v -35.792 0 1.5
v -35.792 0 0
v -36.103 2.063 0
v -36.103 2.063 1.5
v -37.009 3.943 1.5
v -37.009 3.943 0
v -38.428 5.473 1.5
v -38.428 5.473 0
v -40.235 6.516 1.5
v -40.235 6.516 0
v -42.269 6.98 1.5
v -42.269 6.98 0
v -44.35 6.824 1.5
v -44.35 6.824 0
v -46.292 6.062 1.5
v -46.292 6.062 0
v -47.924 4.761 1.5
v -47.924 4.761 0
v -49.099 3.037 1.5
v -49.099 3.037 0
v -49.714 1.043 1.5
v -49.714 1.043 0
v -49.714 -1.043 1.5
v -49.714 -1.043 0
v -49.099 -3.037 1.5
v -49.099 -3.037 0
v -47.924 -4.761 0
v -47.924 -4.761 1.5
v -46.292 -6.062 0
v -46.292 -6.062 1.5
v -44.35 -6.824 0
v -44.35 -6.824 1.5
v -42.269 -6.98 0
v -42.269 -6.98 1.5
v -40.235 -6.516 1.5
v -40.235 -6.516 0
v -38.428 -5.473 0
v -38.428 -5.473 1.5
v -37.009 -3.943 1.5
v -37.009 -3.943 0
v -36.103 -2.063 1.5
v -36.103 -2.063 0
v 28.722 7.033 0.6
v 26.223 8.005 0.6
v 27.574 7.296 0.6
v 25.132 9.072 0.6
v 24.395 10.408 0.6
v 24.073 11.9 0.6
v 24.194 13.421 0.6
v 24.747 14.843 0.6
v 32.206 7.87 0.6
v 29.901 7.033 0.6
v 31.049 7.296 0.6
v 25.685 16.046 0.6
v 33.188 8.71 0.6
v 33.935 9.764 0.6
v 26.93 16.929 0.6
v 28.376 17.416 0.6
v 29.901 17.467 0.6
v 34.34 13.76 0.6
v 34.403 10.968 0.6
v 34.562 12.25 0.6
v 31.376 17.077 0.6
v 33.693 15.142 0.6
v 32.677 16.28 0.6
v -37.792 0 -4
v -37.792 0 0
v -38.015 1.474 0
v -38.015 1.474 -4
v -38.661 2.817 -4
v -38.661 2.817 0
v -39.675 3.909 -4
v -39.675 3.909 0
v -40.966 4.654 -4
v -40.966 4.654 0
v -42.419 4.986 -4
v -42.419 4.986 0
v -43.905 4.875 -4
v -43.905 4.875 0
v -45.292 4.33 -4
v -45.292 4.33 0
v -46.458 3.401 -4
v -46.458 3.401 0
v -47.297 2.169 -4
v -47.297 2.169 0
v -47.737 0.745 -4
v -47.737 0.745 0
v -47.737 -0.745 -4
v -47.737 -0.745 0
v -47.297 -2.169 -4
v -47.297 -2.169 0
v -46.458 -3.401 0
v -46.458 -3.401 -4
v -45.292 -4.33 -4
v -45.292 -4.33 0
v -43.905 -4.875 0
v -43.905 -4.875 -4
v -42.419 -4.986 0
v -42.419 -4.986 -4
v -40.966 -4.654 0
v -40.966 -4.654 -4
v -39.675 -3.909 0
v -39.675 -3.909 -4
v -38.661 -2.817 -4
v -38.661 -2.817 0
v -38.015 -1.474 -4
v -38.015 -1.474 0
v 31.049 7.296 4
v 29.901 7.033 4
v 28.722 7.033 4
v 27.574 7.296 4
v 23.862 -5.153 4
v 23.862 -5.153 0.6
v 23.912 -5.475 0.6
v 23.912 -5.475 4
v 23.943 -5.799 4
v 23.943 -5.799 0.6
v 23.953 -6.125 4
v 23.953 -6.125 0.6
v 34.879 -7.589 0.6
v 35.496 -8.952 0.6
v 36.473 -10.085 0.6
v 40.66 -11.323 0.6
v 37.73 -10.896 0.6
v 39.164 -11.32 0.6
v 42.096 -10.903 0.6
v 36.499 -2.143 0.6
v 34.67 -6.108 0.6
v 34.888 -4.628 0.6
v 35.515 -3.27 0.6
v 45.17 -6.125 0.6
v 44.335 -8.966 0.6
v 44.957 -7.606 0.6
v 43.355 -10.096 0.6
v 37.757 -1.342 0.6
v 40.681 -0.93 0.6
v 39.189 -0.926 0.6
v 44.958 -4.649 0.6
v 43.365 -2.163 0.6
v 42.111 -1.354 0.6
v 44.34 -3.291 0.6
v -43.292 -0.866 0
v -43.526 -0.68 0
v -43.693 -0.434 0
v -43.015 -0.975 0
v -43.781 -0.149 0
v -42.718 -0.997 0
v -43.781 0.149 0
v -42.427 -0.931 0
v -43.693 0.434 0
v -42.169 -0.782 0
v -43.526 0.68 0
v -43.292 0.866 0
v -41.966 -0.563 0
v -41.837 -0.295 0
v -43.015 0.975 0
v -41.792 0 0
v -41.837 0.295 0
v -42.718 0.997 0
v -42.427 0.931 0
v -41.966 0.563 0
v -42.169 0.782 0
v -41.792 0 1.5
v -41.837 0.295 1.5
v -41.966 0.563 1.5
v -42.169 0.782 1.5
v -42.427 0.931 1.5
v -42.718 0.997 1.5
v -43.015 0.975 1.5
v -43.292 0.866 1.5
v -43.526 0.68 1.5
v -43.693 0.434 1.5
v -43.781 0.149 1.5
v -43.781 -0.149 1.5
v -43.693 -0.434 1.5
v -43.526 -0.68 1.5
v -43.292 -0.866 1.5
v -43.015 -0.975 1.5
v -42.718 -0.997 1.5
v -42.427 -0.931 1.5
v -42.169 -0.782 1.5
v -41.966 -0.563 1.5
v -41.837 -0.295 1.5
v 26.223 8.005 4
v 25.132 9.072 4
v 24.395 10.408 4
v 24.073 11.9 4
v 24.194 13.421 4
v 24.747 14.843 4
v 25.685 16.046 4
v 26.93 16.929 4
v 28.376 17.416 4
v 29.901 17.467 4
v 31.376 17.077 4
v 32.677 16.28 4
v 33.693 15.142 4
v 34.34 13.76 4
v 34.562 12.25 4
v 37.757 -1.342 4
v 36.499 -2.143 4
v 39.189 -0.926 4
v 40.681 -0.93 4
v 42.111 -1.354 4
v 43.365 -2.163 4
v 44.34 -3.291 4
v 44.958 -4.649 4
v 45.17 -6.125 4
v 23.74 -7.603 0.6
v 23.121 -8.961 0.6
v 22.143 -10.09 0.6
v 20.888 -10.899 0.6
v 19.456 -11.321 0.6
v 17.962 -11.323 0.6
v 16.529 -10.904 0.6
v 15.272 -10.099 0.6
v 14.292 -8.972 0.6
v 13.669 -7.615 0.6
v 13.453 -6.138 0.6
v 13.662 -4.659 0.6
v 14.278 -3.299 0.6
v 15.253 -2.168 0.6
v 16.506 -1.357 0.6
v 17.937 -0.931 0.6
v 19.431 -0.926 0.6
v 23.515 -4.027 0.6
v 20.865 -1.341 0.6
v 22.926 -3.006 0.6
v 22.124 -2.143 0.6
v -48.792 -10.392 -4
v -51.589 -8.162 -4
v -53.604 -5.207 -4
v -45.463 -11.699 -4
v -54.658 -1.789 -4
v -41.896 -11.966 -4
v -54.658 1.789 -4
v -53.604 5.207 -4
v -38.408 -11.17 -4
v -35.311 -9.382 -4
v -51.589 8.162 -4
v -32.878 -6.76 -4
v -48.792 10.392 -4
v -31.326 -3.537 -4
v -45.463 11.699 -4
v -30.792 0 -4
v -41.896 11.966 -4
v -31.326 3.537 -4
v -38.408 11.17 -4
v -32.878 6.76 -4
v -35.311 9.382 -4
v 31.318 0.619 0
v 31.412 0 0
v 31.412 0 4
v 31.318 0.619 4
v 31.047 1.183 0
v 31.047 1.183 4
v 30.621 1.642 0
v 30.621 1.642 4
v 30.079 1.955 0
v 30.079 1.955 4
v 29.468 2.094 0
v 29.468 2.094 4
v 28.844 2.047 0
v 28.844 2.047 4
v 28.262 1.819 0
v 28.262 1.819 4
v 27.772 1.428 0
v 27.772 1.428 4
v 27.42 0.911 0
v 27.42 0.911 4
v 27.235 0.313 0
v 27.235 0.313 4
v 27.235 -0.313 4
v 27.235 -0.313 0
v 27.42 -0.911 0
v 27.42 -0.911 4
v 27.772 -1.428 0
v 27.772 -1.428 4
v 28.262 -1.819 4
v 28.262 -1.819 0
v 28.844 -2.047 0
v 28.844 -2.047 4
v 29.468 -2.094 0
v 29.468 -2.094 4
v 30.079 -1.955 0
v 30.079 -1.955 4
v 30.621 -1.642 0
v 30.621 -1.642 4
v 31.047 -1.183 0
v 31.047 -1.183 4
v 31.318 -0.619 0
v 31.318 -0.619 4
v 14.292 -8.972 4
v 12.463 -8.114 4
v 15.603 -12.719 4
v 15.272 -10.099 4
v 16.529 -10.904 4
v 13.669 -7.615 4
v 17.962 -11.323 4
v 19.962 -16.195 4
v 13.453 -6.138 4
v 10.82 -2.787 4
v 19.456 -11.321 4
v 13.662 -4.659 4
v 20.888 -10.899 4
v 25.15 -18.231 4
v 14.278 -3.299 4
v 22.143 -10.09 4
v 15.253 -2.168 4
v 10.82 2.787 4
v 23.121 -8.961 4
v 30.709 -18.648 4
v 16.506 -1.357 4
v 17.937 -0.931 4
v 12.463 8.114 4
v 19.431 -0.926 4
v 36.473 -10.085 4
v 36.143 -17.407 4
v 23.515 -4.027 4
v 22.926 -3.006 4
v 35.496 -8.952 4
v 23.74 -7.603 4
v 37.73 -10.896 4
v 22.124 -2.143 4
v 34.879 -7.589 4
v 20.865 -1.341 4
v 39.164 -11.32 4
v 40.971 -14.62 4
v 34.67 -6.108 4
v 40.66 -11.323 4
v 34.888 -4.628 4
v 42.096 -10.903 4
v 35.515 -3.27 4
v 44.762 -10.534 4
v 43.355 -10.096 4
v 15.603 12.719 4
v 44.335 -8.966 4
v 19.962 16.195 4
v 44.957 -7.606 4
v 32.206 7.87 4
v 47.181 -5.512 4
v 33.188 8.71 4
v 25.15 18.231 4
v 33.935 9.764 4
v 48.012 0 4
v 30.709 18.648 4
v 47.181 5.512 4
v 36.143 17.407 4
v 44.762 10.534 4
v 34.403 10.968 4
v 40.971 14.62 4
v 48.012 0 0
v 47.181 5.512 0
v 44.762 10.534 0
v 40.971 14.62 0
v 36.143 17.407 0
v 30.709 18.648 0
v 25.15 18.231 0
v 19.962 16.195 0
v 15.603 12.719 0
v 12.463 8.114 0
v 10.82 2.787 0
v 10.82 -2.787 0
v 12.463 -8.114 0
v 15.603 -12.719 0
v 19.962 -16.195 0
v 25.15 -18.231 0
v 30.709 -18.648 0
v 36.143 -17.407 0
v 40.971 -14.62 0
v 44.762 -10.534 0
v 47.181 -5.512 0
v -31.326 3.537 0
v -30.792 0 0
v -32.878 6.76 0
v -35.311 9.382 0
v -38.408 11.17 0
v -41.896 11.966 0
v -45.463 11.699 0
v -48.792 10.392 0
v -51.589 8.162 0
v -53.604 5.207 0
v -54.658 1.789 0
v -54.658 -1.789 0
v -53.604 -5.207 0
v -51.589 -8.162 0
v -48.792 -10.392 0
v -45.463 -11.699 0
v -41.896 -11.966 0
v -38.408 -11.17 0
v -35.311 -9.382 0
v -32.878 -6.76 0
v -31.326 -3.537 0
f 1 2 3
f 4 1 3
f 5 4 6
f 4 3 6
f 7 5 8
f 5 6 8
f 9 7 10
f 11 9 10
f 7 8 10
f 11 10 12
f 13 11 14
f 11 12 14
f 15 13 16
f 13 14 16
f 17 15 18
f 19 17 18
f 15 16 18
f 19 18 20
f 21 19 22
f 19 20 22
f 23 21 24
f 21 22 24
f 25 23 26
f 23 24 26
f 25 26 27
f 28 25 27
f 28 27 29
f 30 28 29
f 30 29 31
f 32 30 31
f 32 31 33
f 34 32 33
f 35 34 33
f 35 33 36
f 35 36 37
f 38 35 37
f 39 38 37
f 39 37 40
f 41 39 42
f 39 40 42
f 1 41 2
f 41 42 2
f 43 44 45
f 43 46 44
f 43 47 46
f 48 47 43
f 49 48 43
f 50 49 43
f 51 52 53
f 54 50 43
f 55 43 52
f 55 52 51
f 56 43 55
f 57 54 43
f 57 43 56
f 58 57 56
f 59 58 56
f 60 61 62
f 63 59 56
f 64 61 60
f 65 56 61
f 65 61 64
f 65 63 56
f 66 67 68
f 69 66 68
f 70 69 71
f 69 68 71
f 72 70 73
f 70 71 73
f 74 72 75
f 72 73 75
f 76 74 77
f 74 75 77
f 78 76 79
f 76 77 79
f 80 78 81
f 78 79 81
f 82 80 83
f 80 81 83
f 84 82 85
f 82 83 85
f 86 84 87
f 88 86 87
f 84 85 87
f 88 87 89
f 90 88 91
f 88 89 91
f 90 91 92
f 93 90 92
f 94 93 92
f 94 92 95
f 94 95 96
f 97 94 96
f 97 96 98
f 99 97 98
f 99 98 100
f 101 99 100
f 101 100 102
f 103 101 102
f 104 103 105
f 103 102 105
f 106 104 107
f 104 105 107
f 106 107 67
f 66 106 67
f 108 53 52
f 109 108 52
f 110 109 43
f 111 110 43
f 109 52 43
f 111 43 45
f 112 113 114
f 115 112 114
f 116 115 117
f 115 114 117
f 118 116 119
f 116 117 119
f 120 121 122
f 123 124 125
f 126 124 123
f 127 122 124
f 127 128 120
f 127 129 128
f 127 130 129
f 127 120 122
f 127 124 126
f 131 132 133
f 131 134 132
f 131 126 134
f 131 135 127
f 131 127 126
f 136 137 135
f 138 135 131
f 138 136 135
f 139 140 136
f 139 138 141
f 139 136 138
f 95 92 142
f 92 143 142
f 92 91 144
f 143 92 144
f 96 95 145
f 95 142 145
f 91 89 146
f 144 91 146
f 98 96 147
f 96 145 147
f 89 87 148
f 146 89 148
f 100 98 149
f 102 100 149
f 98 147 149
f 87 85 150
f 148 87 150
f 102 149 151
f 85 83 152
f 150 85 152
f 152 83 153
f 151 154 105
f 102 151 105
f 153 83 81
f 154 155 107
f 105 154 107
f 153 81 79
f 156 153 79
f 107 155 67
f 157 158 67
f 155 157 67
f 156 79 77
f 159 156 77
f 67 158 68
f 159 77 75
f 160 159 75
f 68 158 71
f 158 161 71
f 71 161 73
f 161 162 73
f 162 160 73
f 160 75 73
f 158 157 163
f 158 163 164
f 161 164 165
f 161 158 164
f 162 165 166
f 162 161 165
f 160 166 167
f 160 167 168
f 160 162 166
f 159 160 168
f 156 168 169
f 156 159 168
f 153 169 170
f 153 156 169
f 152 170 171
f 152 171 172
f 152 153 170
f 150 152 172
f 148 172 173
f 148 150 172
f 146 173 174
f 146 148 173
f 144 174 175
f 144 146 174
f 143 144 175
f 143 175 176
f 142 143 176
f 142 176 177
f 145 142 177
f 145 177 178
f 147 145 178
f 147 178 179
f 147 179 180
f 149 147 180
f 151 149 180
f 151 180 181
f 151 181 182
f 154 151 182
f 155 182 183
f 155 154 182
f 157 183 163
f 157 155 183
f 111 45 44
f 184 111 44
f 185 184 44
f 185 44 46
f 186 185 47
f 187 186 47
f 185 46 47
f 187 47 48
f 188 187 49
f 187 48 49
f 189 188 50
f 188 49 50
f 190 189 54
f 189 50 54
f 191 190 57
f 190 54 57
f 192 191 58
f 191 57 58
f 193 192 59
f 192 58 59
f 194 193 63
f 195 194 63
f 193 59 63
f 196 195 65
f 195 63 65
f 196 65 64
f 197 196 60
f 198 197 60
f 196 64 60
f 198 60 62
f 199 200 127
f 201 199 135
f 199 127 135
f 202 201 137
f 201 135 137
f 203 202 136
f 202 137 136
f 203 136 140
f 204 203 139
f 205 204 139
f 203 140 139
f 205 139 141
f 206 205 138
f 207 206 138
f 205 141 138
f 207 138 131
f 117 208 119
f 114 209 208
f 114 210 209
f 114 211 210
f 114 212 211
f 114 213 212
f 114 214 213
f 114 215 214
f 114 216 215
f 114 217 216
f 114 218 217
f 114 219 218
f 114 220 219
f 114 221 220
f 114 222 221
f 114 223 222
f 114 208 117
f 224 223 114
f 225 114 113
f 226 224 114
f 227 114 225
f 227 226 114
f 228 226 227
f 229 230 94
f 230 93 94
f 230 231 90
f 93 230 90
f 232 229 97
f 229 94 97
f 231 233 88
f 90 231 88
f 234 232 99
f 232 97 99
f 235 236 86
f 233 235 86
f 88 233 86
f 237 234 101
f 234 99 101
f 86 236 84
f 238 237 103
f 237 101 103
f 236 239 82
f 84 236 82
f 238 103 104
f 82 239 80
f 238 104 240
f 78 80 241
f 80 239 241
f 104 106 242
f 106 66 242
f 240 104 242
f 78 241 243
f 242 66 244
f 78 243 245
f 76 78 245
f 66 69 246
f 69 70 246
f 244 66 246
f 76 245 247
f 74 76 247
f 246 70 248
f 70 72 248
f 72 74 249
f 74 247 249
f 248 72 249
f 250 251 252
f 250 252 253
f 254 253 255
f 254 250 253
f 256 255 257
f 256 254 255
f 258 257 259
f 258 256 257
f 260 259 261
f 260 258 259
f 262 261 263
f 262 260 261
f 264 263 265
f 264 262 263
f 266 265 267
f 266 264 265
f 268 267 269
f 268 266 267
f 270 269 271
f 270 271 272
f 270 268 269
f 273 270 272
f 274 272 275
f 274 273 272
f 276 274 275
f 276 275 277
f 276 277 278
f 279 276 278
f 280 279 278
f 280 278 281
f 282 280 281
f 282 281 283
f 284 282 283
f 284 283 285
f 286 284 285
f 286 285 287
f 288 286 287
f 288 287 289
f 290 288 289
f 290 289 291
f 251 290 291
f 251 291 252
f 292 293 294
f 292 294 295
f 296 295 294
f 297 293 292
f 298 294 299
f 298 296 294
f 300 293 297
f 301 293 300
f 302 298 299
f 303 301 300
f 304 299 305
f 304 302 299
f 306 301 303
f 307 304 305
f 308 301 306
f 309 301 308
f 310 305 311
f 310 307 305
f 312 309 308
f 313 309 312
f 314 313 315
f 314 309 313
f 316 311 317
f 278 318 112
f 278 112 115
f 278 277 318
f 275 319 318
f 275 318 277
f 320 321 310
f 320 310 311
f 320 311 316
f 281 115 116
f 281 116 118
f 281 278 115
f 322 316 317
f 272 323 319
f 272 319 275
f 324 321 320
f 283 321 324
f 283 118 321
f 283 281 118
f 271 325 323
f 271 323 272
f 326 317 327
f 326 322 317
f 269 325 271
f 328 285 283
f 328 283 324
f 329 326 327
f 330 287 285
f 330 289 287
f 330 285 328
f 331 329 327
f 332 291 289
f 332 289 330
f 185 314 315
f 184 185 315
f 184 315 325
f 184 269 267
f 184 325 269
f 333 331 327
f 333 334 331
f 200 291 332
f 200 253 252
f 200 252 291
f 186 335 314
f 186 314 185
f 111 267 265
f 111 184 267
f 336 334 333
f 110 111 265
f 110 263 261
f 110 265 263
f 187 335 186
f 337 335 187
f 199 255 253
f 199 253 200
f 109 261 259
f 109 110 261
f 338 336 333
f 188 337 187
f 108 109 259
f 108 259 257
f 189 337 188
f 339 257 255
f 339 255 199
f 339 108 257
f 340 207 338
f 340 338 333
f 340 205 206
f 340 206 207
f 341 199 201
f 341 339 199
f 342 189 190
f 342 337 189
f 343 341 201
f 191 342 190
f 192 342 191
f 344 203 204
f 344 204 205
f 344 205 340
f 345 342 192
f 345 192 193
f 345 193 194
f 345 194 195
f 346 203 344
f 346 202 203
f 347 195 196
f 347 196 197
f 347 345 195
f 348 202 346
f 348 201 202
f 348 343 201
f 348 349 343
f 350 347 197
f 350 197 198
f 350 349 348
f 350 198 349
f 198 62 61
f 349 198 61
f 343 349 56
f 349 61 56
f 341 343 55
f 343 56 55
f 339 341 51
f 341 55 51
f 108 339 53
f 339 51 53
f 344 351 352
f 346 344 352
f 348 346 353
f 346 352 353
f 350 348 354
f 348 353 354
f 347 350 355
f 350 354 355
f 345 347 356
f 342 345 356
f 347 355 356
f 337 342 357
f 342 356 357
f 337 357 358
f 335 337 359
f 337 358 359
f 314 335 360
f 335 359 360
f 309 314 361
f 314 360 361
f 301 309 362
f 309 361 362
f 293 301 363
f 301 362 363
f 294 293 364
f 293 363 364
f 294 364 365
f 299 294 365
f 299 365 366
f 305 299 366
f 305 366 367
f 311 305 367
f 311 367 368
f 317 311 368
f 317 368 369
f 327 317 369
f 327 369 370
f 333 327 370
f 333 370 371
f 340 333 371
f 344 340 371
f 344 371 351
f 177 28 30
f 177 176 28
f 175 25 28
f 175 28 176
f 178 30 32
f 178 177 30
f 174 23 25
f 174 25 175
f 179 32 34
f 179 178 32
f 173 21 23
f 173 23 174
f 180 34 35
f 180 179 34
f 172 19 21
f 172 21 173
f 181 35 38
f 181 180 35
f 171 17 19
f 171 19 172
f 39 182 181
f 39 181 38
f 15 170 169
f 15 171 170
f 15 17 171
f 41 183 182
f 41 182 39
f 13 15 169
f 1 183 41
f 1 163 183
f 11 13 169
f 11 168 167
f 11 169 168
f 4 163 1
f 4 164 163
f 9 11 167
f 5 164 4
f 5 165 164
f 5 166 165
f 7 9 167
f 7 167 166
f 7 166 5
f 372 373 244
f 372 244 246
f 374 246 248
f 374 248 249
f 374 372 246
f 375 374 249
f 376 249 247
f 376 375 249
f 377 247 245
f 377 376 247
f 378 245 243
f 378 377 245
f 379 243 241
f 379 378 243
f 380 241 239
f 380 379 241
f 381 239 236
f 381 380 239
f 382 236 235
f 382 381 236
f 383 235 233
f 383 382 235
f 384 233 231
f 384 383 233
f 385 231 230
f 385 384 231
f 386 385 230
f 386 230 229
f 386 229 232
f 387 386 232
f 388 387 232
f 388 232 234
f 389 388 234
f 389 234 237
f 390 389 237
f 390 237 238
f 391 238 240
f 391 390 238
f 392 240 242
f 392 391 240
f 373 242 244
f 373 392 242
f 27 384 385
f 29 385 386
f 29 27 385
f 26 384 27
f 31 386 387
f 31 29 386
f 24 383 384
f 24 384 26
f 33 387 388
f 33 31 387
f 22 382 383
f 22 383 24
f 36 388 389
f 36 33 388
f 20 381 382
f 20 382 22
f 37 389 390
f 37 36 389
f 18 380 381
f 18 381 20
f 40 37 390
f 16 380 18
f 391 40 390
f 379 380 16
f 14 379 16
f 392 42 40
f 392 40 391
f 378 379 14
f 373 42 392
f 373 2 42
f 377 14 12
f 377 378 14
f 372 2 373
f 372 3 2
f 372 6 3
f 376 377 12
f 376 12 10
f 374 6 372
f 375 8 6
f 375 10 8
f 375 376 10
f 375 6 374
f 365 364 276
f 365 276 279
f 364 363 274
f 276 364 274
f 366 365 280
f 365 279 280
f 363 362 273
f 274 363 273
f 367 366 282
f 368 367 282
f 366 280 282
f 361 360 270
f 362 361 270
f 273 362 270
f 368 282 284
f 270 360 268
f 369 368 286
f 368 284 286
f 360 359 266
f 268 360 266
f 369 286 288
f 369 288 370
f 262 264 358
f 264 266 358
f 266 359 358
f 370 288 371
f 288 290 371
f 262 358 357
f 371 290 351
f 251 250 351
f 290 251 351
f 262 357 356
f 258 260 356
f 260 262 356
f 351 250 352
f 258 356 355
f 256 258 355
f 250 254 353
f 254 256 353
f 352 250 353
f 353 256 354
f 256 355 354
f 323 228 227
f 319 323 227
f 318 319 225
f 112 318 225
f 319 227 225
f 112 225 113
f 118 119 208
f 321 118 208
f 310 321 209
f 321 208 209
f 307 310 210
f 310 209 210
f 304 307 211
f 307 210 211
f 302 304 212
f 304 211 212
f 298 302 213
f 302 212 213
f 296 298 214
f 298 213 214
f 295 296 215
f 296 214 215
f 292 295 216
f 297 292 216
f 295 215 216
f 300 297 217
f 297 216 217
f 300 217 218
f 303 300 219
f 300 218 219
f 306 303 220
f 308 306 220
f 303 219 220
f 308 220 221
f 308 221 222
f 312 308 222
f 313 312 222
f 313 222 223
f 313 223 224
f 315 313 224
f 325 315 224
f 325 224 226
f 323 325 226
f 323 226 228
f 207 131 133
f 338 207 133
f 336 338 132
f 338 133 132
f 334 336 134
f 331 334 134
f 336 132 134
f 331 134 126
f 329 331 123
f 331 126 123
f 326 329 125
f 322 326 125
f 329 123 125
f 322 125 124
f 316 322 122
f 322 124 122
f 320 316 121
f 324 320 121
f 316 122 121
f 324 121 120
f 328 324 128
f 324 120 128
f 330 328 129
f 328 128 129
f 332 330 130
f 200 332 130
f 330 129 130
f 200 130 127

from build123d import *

# Parameters (mm, degrees)
F0_R     = 12
F0_R_2   = 7
F0_R_3   = 5
F1_DEPTH = 4
F0_R_4   = 4
F0_R_5   = 1
F2_DEPTH = 1.5
F0_R_6   = 18.7
F0_R_7   = 3.75
F0_R_8   = 2.1
F3_DEPTH = 0.6
F4_DEPTH = 4


with BuildPart() as f1:
    # F0 (on Top) → F1 (new body)
    with BuildSketch(Plane.XY):
        with Locations((-42.7924543619, 0)):
            Circle(F0_R)
        with Locations((-42.7924543619, 0)):
            Circle(F0_R_2, mode=Mode.SUBTRACT)
        with Locations((-42.7924543619, 0)):
            Circle(F0_R_2)
        with Locations((-42.7924543619, 0)):
            Circle(F0_R_3, mode=Mode.SUBTRACT)
    extrude(amount=-F1_DEPTH)

    # F0 (on Top) → F2 (join)
    with BuildSketch(Plane.XY):
        with Locations((-42.7924543619, 0)):
            Circle(F0_R_2)
        with Locations((-42.7924543619, 0)):
            Circle(F0_R_3, mode=Mode.SUBTRACT)
        with Locations((-42.7924543619, 0)):
            Circle(F0_R_3)
        with Locations((-42.7924543619, 0)):
            Circle(F0_R_4, mode=Mode.SUBTRACT)
        with Locations((-42.7924543619, 0)):
            Circle(F0_R_4)
        with Locations((-42.7924543619, 0)):
            Circle(F0_R_5, mode=Mode.SUBTRACT)
    extrude(amount=F2_DEPTH)


with BuildPart() as f3:
    # F0 (on Top) → F3 (new body)
    with BuildSketch(Plane.XY):
        with Locations((29.3115582317, 0)):
            Circle(F0_R_6)
        with BuildLine():
            ThreePointArc((27.5738657454, 7.2959183673), (26.2751446855, 16.5328370009), (34.5615582317, 12.25))
            ThreePointArc((34.5615582317, 12.25), (33.5943952326, 9.2135864538), (31.049250718, 7.2959183673))
            ThreePointArc((31.049250718, 7.2959183673), (35.1972482358, 4.6485108558), (36.8115582317, 0))
            ThreePointArc((36.8115582317, 0), (36.7329707219, -1.0828834889), (36.4988551249, -2.1430733466))
            ThreePointArc((36.4988551249, -2.1430733466), (42.1112082981, -1.3539702321), (45.1703694281, -6.125))
            ThreePointArc((45.1703694281, -6.125), (39.4321766612, -11.3522524162), (34.7611626386, -5.1528450208))
            ThreePointArc((34.7611626386, -5.1528450208), (29.3115582317, -7.5), (23.8619538248, -5.1528450208))
            ThreePointArc((23.8619538248, -5.1528450208), (23.9299994515, -5.6368072331), (23.9527470354, -6.125))
            ThreePointArc((23.9527470354, -6.125), (13.9317172675, -8.31583887), (22.1242613385, -2.1430733466))
            ThreePointArc((22.1242613385, -2.1430733466), (22.8163677033, 3.75), (27.5738657454, 7.2959183673))
        make_face(mode=Mode.SUBTRACT)
        with BuildLine():
            ThreePointArc((31.049250718, 7.2959183673), (29.3115582317, 7), (27.5738657454, 7.2959183673))
            ThreePointArc((27.5738657454, 7.2959183673), (22.8163677033, 3.75), (22.1242613385, -2.1430733466))
            ThreePointArc((22.1242613385, -2.1430733466), (23.2493804052, -3.5), (23.8619538248, -5.1528450208))
            ThreePointArc((23.8619538248, -5.1528450208), (29.3115582317, -7.5), (34.7611626386, -5.1528450208))
            ThreePointArc((34.7611626386, -5.1528450208), (35.3737360582, -3.5), (36.4988551249, -2.1430733466))
            ThreePointArc((36.4988551249, -2.1430733466), (36.7329707219, -1.0828834889), (36.8115582317, 0))
            ThreePointArc((36.8115582317, 0), (35.1972482358, 4.6485108558), (31.049250718, 7.2959183673))
        make_face()
        with Locations((29.3115582317, 0)):
            Circle(F0_R_7, mode=Mode.SUBTRACT)
        with BuildLine():
            ThreePointArc((23.8619538248, -5.1528450208), (22.8163677033, -3.75), (22.1242613385, -2.1430733466))
            ThreePointArc((22.1242613385, -2.1430733466), (13.9317172675, -8.31583887), (23.9527470354, -6.125))
            ThreePointArc((23.9527470354, -6.125), (23.9299994515, -5.6368072331), (23.8619538248, -5.1528450208))
        make_face()
        with BuildLine():
            ThreePointArc((31.049250718, 7.2959183673), (33.5943952326, 9.2135864538), (34.5615582317, 12.25))
            ThreePointArc((34.5615582317, 12.25), (26.2751446855, 16.5328370009), (27.5738657454, 7.2959183673))
            ThreePointArc((27.5738657454, 7.2959183673), (29.3115582317, 7.5), (31.049250718, 7.2959183673))
        make_face()
        with BuildLine():
            ThreePointArc((45.1703694281, -6.125), (42.1112082981, -1.3539702321), (36.4988551249, -2.1430733466))
            ThreePointArc((36.4988551249, -2.1430733466), (35.8067487601, -3.75), (34.7611626386, -5.1528450208))
            ThreePointArc((34.7611626386, -5.1528450208), (39.4321766612, -11.3522524162), (45.1703694281, -6.125))
        make_face()
        with Locations((29.3115582317, 0)):
            Circle(F0_R_7)
        with Locations((29.3115582317, 0)):
            Circle(F0_R_8, mode=Mode.SUBTRACT)
        with BuildLine():
            ThreePointArc((23.8619538248, -5.1528450208), (23.2493804052, -3.5), (22.1242613385, -2.1430733466))
            ThreePointArc((22.1242613385, -2.1430733466), (22.8163677033, -3.75), (23.8619538248, -5.1528450208))
        make_face()
        with BuildLine():
            ThreePointArc((31.049250718, 7.2959183673), (29.3115582317, 7.5), (27.5738657454, 7.2959183673))
            ThreePointArc((27.5738657454, 7.2959183673), (29.3115582317, 7), (31.049250718, 7.2959183673))
        make_face()
        with BuildLine():
            ThreePointArc((34.7611626386, -5.1528450208), (35.8067487601, -3.75), (36.4988551249, -2.1430733466))
            ThreePointArc((36.4988551249, -2.1430733466), (35.3737360582, -3.5), (34.7611626386, -5.1528450208))
        make_face()
    extrude(amount=F3_DEPTH)

    # F0 (on Top) → F4 (join)
    with BuildSketch(Plane.XY):
        with Locations((29.3115582317, 0)):
            Circle(F0_R_6)
        with BuildLine():
            ThreePointArc((27.5738657454, 7.2959183673), (26.2751446855, 16.5328370009), (34.5615582317, 12.25))
            ThreePointArc((34.5615582317, 12.25), (33.5943952326, 9.2135864538), (31.049250718, 7.2959183673))
            ThreePointArc((31.049250718, 7.2959183673), (35.1972482358, 4.6485108558), (36.8115582317, 0))
            ThreePointArc((36.8115582317, 0), (36.7329707219, -1.0828834889), (36.4988551249, -2.1430733466))
            ThreePointArc((36.4988551249, -2.1430733466), (42.1112082981, -1.3539702321), (45.1703694281, -6.125))
            ThreePointArc((45.1703694281, -6.125), (39.4321766612, -11.3522524162), (34.7611626386, -5.1528450208))
            ThreePointArc((34.7611626386, -5.1528450208), (29.3115582317, -7.5), (23.8619538248, -5.1528450208))
            ThreePointArc((23.8619538248, -5.1528450208), (23.9299994515, -5.6368072331), (23.9527470354, -6.125))
            ThreePointArc((23.9527470354, -6.125), (13.9317172675, -8.31583887), (22.1242613385, -2.1430733466))
            ThreePointArc((22.1242613385, -2.1430733466), (22.8163677033, 3.75), (27.5738657454, 7.2959183673))
        make_face(mode=Mode.SUBTRACT)
        with BuildLine():
            ThreePointArc((31.049250718, 7.2959183673), (29.3115582317, 7), (27.5738657454, 7.2959183673))
            ThreePointArc((27.5738657454, 7.2959183673), (22.8163677033, 3.75), (22.1242613385, -2.1430733466))
            ThreePointArc((22.1242613385, -2.1430733466), (23.2493804052, -3.5), (23.8619538248, -5.1528450208))
            ThreePointArc((23.8619538248, -5.1528450208), (29.3115582317, -7.5), (34.7611626386, -5.1528450208))
            ThreePointArc((34.7611626386, -5.1528450208), (35.3737360582, -3.5), (36.4988551249, -2.1430733466))
            ThreePointArc((36.4988551249, -2.1430733466), (36.7329707219, -1.0828834889), (36.8115582317, 0))
            ThreePointArc((36.8115582317, 0), (35.1972482358, 4.6485108558), (31.049250718, 7.2959183673))
        make_face()
        with Locations((29.3115582317, 0)):
            Circle(F0_R_7, mode=Mode.SUBTRACT)
        with Locations((29.3115582317, 0)):
            Circle(F0_R_7)
        with Locations((29.3115582317, 0)):
            Circle(F0_R_8, mode=Mode.SUBTRACT)
    extrude(amount=F4_DEPTH)


solid = Compound([f1.part, f3.part])
